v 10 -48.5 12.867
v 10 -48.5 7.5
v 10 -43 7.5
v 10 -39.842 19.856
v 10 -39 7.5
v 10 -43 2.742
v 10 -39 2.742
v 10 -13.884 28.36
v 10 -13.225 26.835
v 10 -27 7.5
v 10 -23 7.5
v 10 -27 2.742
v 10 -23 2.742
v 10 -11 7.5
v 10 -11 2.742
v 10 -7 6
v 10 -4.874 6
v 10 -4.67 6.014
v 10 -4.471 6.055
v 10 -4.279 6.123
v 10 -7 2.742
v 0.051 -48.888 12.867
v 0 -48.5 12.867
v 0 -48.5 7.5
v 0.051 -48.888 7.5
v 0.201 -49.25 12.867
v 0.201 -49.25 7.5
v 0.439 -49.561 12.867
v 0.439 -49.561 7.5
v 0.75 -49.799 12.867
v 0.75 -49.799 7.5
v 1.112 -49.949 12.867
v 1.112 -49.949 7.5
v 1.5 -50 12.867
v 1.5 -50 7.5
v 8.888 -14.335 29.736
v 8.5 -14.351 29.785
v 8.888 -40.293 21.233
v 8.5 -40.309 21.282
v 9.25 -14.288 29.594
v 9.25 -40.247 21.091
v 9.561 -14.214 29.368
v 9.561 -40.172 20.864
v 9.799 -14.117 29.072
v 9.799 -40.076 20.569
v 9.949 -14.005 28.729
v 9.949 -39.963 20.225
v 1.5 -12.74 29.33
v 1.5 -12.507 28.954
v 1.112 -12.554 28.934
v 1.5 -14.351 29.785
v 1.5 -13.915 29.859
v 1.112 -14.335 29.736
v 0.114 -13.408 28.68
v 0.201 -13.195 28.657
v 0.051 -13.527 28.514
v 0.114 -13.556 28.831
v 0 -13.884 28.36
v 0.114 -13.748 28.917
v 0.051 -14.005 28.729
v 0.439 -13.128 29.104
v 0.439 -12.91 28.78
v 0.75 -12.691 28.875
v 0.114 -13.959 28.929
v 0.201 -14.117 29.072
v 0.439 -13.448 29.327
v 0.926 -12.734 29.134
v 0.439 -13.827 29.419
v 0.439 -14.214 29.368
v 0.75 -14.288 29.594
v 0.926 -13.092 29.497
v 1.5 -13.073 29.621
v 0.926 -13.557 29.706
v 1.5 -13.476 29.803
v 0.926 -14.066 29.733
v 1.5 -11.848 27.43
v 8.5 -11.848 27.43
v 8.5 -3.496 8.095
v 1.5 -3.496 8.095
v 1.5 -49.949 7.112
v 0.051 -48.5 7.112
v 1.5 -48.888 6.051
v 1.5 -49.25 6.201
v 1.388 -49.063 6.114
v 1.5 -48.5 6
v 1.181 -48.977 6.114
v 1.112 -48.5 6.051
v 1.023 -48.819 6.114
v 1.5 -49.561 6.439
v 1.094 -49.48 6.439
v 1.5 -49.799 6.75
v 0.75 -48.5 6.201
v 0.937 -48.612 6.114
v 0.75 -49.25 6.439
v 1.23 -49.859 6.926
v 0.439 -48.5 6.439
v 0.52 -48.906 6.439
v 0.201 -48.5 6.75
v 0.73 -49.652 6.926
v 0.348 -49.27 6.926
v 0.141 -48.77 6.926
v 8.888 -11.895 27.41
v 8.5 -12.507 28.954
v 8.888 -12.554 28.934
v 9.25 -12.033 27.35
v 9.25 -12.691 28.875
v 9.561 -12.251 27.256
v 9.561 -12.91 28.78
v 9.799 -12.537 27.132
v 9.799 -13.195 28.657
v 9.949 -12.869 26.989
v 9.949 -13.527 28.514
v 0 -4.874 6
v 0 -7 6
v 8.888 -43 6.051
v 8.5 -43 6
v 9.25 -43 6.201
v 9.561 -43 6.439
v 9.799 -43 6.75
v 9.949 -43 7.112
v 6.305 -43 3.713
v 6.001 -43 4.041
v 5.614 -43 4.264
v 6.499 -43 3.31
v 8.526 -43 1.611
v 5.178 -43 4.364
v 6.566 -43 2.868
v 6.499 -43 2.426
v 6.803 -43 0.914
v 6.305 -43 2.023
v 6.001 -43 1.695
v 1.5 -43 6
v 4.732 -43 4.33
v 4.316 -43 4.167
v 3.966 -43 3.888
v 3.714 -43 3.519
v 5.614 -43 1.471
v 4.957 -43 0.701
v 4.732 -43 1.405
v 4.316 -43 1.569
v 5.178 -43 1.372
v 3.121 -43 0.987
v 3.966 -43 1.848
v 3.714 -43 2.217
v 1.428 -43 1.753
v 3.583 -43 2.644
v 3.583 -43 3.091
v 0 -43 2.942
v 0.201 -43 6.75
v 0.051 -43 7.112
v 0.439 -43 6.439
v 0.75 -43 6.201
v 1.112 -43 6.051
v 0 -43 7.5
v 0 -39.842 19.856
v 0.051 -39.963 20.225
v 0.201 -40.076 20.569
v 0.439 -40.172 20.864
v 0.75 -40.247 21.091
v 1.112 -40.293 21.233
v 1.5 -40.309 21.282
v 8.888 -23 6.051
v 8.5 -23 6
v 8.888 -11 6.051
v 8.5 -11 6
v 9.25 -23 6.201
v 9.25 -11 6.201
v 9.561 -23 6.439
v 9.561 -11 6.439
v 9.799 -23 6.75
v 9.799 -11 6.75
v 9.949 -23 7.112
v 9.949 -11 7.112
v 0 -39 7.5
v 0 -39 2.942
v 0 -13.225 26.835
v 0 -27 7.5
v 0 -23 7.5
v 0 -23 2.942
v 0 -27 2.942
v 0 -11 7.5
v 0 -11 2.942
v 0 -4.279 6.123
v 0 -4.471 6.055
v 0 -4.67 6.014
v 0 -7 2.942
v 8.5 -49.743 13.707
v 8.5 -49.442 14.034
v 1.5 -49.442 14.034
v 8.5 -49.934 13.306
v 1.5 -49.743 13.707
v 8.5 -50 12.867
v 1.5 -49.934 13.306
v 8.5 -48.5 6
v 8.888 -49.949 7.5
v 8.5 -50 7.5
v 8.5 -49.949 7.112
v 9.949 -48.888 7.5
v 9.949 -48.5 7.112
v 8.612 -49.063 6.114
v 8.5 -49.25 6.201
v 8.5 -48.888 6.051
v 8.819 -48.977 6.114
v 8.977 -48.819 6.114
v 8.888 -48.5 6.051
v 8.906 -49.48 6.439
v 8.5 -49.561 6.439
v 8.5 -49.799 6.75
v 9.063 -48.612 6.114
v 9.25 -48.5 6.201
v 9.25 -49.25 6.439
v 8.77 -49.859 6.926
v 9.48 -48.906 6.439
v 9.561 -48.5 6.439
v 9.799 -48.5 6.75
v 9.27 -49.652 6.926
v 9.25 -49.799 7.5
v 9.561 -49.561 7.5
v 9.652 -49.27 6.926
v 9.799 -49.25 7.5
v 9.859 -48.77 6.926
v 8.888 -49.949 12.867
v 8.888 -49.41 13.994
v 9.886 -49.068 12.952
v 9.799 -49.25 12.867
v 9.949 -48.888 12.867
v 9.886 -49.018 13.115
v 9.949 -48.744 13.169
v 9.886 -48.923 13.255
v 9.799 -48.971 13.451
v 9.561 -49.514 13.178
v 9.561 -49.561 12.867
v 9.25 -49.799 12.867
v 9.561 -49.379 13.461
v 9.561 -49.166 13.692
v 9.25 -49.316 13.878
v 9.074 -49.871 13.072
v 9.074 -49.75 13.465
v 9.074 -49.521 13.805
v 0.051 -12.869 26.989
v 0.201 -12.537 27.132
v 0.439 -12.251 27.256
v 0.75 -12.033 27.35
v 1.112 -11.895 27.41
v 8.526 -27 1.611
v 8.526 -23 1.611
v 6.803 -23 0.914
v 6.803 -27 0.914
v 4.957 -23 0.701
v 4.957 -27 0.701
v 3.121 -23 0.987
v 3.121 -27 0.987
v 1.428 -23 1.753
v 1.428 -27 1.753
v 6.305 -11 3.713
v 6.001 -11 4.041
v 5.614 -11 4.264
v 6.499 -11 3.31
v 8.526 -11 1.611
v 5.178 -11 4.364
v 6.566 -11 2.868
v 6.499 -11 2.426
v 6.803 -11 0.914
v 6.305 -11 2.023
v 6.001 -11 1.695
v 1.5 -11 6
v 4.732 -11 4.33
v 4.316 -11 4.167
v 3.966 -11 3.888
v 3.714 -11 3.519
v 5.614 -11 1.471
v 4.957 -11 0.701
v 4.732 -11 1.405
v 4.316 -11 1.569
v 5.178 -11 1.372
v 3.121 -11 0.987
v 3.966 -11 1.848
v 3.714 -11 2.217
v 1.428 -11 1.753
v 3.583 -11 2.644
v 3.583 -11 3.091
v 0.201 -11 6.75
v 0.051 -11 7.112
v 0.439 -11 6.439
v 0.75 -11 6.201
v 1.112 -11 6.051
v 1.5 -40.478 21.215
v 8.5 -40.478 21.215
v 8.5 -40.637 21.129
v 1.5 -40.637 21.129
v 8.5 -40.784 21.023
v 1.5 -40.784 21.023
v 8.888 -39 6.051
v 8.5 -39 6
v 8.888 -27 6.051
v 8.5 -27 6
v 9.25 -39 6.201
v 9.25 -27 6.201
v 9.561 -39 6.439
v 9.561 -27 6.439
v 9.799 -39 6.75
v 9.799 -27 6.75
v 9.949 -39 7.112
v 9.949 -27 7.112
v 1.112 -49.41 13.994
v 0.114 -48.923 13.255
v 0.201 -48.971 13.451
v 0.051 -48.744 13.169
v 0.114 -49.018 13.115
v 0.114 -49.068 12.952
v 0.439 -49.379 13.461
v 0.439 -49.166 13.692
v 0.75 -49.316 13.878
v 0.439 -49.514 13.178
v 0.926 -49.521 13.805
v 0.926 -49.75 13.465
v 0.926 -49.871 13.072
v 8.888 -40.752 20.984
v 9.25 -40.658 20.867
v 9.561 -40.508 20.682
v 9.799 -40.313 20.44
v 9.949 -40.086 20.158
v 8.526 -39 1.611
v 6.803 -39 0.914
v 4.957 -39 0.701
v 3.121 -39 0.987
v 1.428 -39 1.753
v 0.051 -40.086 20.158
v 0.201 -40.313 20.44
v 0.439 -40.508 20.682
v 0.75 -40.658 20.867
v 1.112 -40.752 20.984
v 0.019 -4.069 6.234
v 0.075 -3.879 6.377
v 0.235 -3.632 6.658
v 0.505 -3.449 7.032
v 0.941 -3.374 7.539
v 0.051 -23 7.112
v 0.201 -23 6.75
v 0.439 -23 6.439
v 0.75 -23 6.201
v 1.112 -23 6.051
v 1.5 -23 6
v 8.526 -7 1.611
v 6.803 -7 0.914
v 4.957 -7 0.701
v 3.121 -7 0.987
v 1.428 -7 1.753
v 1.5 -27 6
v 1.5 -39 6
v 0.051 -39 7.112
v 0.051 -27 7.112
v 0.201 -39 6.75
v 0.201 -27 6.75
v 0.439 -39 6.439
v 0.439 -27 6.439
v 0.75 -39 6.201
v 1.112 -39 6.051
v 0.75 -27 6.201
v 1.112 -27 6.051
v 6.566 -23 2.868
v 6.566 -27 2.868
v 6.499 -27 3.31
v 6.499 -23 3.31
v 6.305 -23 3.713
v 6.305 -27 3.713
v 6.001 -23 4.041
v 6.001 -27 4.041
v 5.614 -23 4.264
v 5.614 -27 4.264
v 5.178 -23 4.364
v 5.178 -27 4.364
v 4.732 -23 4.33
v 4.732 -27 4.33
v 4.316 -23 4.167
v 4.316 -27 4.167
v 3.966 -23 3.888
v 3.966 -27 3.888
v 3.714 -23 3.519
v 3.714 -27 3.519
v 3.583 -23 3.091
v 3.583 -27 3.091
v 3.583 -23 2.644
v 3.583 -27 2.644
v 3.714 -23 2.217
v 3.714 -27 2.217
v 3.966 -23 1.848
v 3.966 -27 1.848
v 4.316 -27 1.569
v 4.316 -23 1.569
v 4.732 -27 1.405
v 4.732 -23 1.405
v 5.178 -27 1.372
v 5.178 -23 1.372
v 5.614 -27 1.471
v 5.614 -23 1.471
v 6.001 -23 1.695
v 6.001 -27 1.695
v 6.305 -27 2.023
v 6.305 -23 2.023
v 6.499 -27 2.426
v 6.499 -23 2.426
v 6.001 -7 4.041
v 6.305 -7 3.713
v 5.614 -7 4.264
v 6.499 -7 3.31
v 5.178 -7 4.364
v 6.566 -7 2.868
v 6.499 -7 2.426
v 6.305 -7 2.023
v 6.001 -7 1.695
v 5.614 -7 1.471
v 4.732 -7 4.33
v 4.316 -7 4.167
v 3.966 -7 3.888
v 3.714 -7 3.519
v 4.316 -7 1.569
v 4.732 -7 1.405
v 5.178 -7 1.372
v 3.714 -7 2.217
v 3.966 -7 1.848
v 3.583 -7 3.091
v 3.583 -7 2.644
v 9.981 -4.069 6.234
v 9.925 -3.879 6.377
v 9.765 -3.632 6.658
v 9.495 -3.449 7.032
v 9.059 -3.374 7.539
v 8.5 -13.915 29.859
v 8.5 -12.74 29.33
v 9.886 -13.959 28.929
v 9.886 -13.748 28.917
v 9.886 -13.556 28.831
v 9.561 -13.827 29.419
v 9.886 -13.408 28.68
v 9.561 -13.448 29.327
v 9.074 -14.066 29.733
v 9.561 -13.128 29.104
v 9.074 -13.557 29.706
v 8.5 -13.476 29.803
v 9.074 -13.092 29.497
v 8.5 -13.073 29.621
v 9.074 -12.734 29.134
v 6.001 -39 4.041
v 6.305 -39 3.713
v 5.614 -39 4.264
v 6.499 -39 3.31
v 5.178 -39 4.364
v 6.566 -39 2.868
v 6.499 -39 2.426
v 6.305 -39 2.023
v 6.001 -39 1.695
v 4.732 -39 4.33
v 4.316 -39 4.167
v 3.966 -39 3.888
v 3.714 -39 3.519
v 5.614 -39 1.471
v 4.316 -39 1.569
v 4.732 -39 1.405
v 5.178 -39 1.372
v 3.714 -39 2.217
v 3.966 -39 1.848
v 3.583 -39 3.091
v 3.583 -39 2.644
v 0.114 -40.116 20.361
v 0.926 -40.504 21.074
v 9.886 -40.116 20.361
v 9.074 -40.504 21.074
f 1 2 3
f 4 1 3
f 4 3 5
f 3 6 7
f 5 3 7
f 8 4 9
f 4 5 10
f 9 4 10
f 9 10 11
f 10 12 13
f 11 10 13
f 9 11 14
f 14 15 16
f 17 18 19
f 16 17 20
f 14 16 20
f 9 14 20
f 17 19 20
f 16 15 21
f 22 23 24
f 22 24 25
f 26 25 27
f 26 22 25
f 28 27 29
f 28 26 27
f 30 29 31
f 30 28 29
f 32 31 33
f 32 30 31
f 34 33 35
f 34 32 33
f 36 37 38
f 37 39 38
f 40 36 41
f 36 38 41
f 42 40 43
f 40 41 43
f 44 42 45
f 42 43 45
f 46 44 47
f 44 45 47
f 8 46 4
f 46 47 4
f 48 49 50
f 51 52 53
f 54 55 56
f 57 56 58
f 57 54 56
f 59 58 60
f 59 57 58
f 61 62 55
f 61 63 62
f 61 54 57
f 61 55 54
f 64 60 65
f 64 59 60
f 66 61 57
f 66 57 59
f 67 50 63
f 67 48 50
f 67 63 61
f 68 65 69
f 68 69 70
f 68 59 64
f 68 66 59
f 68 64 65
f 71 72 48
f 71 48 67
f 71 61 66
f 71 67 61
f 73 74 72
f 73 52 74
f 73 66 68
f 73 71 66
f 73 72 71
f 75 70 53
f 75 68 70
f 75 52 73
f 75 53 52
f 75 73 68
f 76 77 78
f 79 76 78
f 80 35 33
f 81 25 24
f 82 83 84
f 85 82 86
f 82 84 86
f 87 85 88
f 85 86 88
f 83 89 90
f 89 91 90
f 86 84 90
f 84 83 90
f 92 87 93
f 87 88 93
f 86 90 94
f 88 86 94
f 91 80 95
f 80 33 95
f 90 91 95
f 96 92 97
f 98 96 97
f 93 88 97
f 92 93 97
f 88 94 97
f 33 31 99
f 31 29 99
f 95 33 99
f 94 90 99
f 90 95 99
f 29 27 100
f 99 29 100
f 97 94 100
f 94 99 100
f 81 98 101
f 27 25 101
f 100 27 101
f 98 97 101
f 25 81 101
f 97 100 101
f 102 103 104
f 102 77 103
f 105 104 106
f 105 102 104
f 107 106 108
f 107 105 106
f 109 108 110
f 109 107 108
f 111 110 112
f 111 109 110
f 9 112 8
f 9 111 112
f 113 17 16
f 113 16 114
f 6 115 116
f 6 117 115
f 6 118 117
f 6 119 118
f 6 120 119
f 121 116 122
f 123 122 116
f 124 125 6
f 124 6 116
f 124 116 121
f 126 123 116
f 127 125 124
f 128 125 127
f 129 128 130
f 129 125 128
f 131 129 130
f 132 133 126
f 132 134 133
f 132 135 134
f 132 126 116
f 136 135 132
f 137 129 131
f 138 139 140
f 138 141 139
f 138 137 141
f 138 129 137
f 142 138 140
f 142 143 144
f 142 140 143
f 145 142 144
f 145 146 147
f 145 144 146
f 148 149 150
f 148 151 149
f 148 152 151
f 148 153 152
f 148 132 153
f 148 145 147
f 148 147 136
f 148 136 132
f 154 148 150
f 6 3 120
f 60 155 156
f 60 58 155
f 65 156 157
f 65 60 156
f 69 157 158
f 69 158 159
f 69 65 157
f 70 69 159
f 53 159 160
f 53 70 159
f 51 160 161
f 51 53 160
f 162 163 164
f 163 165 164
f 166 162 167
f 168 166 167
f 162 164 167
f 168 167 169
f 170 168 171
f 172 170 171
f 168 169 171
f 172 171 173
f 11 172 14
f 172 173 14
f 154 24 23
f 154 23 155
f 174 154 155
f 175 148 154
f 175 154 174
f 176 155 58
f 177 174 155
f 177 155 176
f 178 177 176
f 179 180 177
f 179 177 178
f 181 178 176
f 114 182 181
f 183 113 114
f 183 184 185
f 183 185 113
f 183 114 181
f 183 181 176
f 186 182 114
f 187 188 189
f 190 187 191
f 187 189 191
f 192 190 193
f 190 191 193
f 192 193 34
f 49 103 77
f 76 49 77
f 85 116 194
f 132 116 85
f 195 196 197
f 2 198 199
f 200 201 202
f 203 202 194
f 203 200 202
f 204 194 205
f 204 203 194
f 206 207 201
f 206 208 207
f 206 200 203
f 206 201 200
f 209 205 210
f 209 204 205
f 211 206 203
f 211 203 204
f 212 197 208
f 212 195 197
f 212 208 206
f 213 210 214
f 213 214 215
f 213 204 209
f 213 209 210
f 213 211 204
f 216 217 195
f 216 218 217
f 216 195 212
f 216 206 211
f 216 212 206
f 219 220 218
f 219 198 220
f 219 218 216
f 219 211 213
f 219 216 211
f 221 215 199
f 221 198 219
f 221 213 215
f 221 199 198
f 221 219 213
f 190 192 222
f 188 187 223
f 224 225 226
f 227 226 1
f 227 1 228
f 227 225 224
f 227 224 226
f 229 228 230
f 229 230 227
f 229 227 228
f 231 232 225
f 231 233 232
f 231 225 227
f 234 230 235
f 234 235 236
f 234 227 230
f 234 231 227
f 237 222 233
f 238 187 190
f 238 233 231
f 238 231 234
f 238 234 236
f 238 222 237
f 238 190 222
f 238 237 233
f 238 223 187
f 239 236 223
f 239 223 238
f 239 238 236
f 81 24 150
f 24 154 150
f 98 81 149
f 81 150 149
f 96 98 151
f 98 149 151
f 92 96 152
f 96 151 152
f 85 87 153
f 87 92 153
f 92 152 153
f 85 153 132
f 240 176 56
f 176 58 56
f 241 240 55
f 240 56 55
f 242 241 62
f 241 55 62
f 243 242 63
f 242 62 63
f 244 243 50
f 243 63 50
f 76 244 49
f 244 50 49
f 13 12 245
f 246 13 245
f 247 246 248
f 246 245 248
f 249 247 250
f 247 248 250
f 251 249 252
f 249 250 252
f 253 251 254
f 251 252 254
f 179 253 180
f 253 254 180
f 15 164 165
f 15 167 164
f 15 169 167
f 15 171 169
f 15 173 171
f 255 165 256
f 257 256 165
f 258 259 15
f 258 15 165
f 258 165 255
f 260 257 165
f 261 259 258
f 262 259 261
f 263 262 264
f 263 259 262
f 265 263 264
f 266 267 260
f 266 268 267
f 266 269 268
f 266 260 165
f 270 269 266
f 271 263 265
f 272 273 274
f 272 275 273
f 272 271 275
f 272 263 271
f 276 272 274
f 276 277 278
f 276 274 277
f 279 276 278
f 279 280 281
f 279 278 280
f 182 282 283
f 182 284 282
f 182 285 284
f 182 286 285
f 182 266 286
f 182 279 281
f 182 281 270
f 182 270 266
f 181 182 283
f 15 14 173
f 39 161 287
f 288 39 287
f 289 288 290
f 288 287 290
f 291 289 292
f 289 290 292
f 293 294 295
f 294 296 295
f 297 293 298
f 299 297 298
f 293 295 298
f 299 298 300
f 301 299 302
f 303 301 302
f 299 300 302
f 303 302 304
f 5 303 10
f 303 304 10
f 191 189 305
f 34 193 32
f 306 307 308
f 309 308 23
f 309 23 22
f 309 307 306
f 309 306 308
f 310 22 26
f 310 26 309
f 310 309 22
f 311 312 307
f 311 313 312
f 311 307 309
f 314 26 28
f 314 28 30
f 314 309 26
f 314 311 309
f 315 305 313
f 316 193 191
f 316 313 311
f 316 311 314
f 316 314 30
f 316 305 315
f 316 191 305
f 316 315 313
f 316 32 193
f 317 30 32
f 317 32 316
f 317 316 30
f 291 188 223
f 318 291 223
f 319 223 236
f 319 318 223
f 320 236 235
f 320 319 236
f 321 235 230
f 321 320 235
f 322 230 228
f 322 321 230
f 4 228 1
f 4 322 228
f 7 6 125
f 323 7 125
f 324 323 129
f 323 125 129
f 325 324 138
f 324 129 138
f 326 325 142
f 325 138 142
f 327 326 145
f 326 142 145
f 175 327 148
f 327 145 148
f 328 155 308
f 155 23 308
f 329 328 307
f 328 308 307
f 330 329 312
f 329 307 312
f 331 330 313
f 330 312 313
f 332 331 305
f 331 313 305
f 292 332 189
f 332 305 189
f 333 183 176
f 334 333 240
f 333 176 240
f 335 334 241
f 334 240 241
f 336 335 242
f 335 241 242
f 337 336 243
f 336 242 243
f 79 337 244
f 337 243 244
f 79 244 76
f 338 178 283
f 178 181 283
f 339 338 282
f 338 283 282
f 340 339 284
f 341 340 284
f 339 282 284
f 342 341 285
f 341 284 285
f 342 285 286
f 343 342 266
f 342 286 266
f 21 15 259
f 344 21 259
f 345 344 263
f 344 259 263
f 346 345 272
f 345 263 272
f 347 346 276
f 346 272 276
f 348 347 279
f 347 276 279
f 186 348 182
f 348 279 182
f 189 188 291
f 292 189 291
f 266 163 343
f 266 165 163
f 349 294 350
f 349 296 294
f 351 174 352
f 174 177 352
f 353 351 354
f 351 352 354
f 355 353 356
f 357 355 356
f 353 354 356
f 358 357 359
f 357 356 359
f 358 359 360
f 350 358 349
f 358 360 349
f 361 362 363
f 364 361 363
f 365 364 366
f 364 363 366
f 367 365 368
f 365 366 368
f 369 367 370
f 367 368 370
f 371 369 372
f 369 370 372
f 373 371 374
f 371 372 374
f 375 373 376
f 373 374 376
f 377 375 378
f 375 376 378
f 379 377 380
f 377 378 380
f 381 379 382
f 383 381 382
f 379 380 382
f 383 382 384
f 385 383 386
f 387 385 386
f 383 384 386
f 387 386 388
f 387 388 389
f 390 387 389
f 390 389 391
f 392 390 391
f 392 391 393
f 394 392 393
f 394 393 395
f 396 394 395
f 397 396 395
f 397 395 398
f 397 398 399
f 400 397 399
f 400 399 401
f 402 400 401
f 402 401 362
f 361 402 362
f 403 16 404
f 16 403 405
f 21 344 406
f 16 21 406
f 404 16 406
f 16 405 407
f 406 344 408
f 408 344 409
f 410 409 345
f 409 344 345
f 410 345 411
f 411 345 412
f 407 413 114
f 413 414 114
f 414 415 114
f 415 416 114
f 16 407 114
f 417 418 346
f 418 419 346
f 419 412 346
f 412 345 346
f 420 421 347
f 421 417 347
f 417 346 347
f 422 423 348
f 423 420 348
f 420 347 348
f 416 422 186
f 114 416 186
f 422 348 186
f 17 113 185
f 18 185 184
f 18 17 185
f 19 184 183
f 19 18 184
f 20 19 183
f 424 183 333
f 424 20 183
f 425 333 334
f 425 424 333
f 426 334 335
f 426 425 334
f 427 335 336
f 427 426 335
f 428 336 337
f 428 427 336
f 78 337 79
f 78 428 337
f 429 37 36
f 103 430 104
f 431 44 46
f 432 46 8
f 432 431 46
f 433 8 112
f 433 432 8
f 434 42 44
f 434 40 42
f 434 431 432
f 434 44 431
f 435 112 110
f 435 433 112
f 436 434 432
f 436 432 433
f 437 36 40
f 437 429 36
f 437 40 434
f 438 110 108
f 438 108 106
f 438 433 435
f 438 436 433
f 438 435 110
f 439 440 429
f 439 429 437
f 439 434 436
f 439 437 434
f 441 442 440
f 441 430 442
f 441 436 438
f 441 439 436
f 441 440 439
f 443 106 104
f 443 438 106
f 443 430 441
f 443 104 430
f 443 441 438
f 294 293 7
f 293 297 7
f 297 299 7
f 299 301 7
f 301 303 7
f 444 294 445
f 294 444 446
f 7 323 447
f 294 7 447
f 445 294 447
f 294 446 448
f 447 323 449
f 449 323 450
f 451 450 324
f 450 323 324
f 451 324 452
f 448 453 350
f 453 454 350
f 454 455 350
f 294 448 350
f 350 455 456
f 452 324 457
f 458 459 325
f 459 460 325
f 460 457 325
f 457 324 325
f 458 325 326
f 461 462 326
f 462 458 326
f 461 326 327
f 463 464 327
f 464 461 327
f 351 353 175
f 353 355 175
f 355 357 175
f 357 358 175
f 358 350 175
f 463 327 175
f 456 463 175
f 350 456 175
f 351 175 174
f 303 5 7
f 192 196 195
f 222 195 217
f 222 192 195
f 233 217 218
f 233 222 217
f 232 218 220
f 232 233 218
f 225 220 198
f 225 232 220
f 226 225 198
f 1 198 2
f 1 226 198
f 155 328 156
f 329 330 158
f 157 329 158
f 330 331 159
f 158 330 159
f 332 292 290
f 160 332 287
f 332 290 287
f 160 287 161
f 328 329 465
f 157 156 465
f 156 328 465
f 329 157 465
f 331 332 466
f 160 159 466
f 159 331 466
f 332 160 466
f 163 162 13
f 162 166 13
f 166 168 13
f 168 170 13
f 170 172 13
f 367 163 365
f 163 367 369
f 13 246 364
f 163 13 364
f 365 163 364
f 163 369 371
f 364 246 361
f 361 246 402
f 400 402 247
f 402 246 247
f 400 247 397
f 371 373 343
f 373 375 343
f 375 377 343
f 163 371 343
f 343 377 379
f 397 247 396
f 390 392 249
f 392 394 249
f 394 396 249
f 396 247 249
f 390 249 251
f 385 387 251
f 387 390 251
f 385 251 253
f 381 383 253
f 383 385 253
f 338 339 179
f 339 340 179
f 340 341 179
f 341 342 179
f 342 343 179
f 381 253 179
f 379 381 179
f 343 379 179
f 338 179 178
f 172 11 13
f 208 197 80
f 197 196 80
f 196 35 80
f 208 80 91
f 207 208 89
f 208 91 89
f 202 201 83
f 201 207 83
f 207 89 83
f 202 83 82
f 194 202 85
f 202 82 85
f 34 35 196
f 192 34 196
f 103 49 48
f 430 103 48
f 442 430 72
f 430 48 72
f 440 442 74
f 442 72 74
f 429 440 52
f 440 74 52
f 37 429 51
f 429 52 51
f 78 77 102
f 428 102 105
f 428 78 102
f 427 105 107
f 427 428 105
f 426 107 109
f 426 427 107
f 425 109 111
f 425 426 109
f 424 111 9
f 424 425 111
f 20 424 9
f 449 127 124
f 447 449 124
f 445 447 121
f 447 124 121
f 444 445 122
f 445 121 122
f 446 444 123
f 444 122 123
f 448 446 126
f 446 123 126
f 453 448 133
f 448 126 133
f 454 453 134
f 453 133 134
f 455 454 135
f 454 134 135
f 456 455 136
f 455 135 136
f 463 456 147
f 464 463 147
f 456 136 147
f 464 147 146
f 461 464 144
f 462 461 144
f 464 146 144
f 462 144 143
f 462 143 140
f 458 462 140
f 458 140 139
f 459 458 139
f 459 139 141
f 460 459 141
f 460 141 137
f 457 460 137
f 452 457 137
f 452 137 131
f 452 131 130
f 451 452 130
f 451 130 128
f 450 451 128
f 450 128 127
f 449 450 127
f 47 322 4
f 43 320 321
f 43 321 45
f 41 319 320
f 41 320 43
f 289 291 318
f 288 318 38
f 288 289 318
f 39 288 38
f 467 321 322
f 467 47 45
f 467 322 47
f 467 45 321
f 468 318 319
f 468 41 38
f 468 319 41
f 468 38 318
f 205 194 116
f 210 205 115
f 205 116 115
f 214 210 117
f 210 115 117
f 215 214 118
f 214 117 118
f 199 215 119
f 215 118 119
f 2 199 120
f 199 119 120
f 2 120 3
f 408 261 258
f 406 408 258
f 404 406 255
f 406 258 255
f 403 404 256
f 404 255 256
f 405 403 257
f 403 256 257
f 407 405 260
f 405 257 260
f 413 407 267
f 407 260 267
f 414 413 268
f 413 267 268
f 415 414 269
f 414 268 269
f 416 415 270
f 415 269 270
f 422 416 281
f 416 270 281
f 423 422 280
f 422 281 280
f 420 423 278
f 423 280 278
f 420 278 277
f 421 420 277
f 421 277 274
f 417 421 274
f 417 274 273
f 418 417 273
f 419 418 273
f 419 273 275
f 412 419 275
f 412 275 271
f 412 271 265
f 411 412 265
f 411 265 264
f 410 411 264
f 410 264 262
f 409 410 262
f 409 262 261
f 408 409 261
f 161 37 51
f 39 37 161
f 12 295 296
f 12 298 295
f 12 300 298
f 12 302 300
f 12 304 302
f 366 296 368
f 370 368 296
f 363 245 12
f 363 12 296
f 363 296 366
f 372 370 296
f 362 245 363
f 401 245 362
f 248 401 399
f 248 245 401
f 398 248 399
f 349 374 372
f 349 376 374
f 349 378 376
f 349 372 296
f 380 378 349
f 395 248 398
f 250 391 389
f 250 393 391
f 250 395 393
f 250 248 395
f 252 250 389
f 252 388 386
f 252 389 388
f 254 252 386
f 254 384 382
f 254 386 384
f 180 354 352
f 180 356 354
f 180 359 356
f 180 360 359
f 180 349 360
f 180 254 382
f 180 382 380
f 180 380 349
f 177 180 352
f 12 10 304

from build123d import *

# Parameters (mm, degrees)
SKETCH1_W           = 10
SKETCH1_H           = 50
BOSS_EXTRUDE1_DEPTH = 40
CUT_EXTRUDE1_DEPTH  = 40
CUT_EXTRUDE2_DEPTH  = 40
SKETCH4_W           = 10
SKETCH4_H           = 7
SKETCH4_H_2         = 12
CUT_EXTRUDE3_DEPTH  = 6
SKETCH5_R           = 1.5
CUT_EXTRUDE4_DEPTH  = 38
CUT_EXTRUDE5_DEPTH  = 38
FILLET1_R           = 1.5


with BuildPart() as part:
    # Sketch1 → Boss-Extrude1 (new body)
    with BuildSketch(Plane.XY):
        with Locations((5, -25)):
            Rectangle(SKETCH1_W, SKETCH1_H)
    extrude(amount=BOSS_EXTRUDE1_DEPTH)

    # Sketch2 → Cut-Extrude1 (cut)
    with BuildSketch(Plane(origin=(10, 0, 0), x_dir=(0, 0, -1), z_dir=(1, 0, 0))):
        Polygon((-27.429786362, -11.848127256), (0, 0), (-40, 0), (-40, -17.277753606), align=None)
        Polygon((-23.790339217, -37.357038236), (-40, -17.277753606), (-40, -50), (-13.583893856, -50), align=None)
    extrude(amount=-CUT_EXTRUDE1_DEPTH, mode=Mode.SUBTRACT)

    # Sketch3 → Cut-Extrude2 (cut)
    with BuildSketch(Plane(origin=(10, 0, 0), x_dir=(0, 0, -1), z_dir=(1, 0, 0))):
        Polygon((-30.211268677, -13.049571408), (-21.196168582, -40.570497868), (-40, -17.277753606), align=None)
    extrude(amount=-CUT_EXTRUDE2_DEPTH, mode=Mode.SUBTRACT)

    # Sketch4 → Cut-Extrude3 (cut)
    with BuildSketch(Plane(origin=(0, 0, 0), x_dir=(-1, 0, 0), z_dir=(0, 0, -1))):
        with Locations((-5, -3.5)):
            Rectangle(SKETCH4_W, SKETCH4_H)
        with Locations((-5, -17)):
            Rectangle(SKETCH4_W, SKETCH4_H_2)
        with Locations((-5, -33)):
            Rectangle(SKETCH4_W, SKETCH4_H_2)
        with Locations((-5, -46.5)):
            Rectangle(SKETCH4_W, SKETCH4_H)
    extrude(amount=-CUT_EXTRUDE3_DEPTH, mode=Mode.SUBTRACT)

    # Sketch5 → Cut-Extrude4 (cut)
    with BuildSketch(Plane.XZ.offset(43)):
        with Locations((5.065925619, 2.867770419)):
            Circle(SKETCH5_R)
    extrude(amount=-CUT_EXTRUDE4_DEPTH, mode=Mode.SUBTRACT)

    # Sketch6 → Cut-Extrude5 (cut)
    with BuildSketch(Plane.XZ.offset(43)):
        with BuildLine():
            ThreePointArc((10, 2.741877925), (4.957177855, 0.700758069), (0, 2.941876799))
            Line((0, 2.941876799), (0, 0))
            Line((0, 0), (10, 0))
            Line((10, 0), (10, 2.741877925))
        make_face()
    extrude(amount=-CUT_EXTRUDE5_DEPTH, mode=Mode.SUBTRACT)

    # Fillet1
    fillet1_edges = [part.edges().sort_by_distance(p)[0] for p in [
        (0, -7.820617225, 18.105634338),
        (5, -2.591663041, 6),
        (10, -7.820617225, 18.105634338),
        (0, -50, 9.791946928),
        (10, -50, 9.791946928),
        (5, -50, 6),
        (10, -45.285248934, 17.390031219),
        (5, -50, 13.583893856),
        (0, -45.285248934, 17.390031219),
        (0, -26.810034638, 25.703718629),
        (5, -13.049571408, 30.211268677),
        (10, -26.810034638, 25.703718629),
        (5, -40.570497868, 21.196168582),
        (0, -46.5, 6),
        (0, -33, 6),
        (0, -17, 6),
        (10, -46.5, 6),
        (10, -33, 6),
        (10, -17, 6),
    ]]
    fillet(fillet1_edges, radius=FILLET1_R)


solid = part.part
